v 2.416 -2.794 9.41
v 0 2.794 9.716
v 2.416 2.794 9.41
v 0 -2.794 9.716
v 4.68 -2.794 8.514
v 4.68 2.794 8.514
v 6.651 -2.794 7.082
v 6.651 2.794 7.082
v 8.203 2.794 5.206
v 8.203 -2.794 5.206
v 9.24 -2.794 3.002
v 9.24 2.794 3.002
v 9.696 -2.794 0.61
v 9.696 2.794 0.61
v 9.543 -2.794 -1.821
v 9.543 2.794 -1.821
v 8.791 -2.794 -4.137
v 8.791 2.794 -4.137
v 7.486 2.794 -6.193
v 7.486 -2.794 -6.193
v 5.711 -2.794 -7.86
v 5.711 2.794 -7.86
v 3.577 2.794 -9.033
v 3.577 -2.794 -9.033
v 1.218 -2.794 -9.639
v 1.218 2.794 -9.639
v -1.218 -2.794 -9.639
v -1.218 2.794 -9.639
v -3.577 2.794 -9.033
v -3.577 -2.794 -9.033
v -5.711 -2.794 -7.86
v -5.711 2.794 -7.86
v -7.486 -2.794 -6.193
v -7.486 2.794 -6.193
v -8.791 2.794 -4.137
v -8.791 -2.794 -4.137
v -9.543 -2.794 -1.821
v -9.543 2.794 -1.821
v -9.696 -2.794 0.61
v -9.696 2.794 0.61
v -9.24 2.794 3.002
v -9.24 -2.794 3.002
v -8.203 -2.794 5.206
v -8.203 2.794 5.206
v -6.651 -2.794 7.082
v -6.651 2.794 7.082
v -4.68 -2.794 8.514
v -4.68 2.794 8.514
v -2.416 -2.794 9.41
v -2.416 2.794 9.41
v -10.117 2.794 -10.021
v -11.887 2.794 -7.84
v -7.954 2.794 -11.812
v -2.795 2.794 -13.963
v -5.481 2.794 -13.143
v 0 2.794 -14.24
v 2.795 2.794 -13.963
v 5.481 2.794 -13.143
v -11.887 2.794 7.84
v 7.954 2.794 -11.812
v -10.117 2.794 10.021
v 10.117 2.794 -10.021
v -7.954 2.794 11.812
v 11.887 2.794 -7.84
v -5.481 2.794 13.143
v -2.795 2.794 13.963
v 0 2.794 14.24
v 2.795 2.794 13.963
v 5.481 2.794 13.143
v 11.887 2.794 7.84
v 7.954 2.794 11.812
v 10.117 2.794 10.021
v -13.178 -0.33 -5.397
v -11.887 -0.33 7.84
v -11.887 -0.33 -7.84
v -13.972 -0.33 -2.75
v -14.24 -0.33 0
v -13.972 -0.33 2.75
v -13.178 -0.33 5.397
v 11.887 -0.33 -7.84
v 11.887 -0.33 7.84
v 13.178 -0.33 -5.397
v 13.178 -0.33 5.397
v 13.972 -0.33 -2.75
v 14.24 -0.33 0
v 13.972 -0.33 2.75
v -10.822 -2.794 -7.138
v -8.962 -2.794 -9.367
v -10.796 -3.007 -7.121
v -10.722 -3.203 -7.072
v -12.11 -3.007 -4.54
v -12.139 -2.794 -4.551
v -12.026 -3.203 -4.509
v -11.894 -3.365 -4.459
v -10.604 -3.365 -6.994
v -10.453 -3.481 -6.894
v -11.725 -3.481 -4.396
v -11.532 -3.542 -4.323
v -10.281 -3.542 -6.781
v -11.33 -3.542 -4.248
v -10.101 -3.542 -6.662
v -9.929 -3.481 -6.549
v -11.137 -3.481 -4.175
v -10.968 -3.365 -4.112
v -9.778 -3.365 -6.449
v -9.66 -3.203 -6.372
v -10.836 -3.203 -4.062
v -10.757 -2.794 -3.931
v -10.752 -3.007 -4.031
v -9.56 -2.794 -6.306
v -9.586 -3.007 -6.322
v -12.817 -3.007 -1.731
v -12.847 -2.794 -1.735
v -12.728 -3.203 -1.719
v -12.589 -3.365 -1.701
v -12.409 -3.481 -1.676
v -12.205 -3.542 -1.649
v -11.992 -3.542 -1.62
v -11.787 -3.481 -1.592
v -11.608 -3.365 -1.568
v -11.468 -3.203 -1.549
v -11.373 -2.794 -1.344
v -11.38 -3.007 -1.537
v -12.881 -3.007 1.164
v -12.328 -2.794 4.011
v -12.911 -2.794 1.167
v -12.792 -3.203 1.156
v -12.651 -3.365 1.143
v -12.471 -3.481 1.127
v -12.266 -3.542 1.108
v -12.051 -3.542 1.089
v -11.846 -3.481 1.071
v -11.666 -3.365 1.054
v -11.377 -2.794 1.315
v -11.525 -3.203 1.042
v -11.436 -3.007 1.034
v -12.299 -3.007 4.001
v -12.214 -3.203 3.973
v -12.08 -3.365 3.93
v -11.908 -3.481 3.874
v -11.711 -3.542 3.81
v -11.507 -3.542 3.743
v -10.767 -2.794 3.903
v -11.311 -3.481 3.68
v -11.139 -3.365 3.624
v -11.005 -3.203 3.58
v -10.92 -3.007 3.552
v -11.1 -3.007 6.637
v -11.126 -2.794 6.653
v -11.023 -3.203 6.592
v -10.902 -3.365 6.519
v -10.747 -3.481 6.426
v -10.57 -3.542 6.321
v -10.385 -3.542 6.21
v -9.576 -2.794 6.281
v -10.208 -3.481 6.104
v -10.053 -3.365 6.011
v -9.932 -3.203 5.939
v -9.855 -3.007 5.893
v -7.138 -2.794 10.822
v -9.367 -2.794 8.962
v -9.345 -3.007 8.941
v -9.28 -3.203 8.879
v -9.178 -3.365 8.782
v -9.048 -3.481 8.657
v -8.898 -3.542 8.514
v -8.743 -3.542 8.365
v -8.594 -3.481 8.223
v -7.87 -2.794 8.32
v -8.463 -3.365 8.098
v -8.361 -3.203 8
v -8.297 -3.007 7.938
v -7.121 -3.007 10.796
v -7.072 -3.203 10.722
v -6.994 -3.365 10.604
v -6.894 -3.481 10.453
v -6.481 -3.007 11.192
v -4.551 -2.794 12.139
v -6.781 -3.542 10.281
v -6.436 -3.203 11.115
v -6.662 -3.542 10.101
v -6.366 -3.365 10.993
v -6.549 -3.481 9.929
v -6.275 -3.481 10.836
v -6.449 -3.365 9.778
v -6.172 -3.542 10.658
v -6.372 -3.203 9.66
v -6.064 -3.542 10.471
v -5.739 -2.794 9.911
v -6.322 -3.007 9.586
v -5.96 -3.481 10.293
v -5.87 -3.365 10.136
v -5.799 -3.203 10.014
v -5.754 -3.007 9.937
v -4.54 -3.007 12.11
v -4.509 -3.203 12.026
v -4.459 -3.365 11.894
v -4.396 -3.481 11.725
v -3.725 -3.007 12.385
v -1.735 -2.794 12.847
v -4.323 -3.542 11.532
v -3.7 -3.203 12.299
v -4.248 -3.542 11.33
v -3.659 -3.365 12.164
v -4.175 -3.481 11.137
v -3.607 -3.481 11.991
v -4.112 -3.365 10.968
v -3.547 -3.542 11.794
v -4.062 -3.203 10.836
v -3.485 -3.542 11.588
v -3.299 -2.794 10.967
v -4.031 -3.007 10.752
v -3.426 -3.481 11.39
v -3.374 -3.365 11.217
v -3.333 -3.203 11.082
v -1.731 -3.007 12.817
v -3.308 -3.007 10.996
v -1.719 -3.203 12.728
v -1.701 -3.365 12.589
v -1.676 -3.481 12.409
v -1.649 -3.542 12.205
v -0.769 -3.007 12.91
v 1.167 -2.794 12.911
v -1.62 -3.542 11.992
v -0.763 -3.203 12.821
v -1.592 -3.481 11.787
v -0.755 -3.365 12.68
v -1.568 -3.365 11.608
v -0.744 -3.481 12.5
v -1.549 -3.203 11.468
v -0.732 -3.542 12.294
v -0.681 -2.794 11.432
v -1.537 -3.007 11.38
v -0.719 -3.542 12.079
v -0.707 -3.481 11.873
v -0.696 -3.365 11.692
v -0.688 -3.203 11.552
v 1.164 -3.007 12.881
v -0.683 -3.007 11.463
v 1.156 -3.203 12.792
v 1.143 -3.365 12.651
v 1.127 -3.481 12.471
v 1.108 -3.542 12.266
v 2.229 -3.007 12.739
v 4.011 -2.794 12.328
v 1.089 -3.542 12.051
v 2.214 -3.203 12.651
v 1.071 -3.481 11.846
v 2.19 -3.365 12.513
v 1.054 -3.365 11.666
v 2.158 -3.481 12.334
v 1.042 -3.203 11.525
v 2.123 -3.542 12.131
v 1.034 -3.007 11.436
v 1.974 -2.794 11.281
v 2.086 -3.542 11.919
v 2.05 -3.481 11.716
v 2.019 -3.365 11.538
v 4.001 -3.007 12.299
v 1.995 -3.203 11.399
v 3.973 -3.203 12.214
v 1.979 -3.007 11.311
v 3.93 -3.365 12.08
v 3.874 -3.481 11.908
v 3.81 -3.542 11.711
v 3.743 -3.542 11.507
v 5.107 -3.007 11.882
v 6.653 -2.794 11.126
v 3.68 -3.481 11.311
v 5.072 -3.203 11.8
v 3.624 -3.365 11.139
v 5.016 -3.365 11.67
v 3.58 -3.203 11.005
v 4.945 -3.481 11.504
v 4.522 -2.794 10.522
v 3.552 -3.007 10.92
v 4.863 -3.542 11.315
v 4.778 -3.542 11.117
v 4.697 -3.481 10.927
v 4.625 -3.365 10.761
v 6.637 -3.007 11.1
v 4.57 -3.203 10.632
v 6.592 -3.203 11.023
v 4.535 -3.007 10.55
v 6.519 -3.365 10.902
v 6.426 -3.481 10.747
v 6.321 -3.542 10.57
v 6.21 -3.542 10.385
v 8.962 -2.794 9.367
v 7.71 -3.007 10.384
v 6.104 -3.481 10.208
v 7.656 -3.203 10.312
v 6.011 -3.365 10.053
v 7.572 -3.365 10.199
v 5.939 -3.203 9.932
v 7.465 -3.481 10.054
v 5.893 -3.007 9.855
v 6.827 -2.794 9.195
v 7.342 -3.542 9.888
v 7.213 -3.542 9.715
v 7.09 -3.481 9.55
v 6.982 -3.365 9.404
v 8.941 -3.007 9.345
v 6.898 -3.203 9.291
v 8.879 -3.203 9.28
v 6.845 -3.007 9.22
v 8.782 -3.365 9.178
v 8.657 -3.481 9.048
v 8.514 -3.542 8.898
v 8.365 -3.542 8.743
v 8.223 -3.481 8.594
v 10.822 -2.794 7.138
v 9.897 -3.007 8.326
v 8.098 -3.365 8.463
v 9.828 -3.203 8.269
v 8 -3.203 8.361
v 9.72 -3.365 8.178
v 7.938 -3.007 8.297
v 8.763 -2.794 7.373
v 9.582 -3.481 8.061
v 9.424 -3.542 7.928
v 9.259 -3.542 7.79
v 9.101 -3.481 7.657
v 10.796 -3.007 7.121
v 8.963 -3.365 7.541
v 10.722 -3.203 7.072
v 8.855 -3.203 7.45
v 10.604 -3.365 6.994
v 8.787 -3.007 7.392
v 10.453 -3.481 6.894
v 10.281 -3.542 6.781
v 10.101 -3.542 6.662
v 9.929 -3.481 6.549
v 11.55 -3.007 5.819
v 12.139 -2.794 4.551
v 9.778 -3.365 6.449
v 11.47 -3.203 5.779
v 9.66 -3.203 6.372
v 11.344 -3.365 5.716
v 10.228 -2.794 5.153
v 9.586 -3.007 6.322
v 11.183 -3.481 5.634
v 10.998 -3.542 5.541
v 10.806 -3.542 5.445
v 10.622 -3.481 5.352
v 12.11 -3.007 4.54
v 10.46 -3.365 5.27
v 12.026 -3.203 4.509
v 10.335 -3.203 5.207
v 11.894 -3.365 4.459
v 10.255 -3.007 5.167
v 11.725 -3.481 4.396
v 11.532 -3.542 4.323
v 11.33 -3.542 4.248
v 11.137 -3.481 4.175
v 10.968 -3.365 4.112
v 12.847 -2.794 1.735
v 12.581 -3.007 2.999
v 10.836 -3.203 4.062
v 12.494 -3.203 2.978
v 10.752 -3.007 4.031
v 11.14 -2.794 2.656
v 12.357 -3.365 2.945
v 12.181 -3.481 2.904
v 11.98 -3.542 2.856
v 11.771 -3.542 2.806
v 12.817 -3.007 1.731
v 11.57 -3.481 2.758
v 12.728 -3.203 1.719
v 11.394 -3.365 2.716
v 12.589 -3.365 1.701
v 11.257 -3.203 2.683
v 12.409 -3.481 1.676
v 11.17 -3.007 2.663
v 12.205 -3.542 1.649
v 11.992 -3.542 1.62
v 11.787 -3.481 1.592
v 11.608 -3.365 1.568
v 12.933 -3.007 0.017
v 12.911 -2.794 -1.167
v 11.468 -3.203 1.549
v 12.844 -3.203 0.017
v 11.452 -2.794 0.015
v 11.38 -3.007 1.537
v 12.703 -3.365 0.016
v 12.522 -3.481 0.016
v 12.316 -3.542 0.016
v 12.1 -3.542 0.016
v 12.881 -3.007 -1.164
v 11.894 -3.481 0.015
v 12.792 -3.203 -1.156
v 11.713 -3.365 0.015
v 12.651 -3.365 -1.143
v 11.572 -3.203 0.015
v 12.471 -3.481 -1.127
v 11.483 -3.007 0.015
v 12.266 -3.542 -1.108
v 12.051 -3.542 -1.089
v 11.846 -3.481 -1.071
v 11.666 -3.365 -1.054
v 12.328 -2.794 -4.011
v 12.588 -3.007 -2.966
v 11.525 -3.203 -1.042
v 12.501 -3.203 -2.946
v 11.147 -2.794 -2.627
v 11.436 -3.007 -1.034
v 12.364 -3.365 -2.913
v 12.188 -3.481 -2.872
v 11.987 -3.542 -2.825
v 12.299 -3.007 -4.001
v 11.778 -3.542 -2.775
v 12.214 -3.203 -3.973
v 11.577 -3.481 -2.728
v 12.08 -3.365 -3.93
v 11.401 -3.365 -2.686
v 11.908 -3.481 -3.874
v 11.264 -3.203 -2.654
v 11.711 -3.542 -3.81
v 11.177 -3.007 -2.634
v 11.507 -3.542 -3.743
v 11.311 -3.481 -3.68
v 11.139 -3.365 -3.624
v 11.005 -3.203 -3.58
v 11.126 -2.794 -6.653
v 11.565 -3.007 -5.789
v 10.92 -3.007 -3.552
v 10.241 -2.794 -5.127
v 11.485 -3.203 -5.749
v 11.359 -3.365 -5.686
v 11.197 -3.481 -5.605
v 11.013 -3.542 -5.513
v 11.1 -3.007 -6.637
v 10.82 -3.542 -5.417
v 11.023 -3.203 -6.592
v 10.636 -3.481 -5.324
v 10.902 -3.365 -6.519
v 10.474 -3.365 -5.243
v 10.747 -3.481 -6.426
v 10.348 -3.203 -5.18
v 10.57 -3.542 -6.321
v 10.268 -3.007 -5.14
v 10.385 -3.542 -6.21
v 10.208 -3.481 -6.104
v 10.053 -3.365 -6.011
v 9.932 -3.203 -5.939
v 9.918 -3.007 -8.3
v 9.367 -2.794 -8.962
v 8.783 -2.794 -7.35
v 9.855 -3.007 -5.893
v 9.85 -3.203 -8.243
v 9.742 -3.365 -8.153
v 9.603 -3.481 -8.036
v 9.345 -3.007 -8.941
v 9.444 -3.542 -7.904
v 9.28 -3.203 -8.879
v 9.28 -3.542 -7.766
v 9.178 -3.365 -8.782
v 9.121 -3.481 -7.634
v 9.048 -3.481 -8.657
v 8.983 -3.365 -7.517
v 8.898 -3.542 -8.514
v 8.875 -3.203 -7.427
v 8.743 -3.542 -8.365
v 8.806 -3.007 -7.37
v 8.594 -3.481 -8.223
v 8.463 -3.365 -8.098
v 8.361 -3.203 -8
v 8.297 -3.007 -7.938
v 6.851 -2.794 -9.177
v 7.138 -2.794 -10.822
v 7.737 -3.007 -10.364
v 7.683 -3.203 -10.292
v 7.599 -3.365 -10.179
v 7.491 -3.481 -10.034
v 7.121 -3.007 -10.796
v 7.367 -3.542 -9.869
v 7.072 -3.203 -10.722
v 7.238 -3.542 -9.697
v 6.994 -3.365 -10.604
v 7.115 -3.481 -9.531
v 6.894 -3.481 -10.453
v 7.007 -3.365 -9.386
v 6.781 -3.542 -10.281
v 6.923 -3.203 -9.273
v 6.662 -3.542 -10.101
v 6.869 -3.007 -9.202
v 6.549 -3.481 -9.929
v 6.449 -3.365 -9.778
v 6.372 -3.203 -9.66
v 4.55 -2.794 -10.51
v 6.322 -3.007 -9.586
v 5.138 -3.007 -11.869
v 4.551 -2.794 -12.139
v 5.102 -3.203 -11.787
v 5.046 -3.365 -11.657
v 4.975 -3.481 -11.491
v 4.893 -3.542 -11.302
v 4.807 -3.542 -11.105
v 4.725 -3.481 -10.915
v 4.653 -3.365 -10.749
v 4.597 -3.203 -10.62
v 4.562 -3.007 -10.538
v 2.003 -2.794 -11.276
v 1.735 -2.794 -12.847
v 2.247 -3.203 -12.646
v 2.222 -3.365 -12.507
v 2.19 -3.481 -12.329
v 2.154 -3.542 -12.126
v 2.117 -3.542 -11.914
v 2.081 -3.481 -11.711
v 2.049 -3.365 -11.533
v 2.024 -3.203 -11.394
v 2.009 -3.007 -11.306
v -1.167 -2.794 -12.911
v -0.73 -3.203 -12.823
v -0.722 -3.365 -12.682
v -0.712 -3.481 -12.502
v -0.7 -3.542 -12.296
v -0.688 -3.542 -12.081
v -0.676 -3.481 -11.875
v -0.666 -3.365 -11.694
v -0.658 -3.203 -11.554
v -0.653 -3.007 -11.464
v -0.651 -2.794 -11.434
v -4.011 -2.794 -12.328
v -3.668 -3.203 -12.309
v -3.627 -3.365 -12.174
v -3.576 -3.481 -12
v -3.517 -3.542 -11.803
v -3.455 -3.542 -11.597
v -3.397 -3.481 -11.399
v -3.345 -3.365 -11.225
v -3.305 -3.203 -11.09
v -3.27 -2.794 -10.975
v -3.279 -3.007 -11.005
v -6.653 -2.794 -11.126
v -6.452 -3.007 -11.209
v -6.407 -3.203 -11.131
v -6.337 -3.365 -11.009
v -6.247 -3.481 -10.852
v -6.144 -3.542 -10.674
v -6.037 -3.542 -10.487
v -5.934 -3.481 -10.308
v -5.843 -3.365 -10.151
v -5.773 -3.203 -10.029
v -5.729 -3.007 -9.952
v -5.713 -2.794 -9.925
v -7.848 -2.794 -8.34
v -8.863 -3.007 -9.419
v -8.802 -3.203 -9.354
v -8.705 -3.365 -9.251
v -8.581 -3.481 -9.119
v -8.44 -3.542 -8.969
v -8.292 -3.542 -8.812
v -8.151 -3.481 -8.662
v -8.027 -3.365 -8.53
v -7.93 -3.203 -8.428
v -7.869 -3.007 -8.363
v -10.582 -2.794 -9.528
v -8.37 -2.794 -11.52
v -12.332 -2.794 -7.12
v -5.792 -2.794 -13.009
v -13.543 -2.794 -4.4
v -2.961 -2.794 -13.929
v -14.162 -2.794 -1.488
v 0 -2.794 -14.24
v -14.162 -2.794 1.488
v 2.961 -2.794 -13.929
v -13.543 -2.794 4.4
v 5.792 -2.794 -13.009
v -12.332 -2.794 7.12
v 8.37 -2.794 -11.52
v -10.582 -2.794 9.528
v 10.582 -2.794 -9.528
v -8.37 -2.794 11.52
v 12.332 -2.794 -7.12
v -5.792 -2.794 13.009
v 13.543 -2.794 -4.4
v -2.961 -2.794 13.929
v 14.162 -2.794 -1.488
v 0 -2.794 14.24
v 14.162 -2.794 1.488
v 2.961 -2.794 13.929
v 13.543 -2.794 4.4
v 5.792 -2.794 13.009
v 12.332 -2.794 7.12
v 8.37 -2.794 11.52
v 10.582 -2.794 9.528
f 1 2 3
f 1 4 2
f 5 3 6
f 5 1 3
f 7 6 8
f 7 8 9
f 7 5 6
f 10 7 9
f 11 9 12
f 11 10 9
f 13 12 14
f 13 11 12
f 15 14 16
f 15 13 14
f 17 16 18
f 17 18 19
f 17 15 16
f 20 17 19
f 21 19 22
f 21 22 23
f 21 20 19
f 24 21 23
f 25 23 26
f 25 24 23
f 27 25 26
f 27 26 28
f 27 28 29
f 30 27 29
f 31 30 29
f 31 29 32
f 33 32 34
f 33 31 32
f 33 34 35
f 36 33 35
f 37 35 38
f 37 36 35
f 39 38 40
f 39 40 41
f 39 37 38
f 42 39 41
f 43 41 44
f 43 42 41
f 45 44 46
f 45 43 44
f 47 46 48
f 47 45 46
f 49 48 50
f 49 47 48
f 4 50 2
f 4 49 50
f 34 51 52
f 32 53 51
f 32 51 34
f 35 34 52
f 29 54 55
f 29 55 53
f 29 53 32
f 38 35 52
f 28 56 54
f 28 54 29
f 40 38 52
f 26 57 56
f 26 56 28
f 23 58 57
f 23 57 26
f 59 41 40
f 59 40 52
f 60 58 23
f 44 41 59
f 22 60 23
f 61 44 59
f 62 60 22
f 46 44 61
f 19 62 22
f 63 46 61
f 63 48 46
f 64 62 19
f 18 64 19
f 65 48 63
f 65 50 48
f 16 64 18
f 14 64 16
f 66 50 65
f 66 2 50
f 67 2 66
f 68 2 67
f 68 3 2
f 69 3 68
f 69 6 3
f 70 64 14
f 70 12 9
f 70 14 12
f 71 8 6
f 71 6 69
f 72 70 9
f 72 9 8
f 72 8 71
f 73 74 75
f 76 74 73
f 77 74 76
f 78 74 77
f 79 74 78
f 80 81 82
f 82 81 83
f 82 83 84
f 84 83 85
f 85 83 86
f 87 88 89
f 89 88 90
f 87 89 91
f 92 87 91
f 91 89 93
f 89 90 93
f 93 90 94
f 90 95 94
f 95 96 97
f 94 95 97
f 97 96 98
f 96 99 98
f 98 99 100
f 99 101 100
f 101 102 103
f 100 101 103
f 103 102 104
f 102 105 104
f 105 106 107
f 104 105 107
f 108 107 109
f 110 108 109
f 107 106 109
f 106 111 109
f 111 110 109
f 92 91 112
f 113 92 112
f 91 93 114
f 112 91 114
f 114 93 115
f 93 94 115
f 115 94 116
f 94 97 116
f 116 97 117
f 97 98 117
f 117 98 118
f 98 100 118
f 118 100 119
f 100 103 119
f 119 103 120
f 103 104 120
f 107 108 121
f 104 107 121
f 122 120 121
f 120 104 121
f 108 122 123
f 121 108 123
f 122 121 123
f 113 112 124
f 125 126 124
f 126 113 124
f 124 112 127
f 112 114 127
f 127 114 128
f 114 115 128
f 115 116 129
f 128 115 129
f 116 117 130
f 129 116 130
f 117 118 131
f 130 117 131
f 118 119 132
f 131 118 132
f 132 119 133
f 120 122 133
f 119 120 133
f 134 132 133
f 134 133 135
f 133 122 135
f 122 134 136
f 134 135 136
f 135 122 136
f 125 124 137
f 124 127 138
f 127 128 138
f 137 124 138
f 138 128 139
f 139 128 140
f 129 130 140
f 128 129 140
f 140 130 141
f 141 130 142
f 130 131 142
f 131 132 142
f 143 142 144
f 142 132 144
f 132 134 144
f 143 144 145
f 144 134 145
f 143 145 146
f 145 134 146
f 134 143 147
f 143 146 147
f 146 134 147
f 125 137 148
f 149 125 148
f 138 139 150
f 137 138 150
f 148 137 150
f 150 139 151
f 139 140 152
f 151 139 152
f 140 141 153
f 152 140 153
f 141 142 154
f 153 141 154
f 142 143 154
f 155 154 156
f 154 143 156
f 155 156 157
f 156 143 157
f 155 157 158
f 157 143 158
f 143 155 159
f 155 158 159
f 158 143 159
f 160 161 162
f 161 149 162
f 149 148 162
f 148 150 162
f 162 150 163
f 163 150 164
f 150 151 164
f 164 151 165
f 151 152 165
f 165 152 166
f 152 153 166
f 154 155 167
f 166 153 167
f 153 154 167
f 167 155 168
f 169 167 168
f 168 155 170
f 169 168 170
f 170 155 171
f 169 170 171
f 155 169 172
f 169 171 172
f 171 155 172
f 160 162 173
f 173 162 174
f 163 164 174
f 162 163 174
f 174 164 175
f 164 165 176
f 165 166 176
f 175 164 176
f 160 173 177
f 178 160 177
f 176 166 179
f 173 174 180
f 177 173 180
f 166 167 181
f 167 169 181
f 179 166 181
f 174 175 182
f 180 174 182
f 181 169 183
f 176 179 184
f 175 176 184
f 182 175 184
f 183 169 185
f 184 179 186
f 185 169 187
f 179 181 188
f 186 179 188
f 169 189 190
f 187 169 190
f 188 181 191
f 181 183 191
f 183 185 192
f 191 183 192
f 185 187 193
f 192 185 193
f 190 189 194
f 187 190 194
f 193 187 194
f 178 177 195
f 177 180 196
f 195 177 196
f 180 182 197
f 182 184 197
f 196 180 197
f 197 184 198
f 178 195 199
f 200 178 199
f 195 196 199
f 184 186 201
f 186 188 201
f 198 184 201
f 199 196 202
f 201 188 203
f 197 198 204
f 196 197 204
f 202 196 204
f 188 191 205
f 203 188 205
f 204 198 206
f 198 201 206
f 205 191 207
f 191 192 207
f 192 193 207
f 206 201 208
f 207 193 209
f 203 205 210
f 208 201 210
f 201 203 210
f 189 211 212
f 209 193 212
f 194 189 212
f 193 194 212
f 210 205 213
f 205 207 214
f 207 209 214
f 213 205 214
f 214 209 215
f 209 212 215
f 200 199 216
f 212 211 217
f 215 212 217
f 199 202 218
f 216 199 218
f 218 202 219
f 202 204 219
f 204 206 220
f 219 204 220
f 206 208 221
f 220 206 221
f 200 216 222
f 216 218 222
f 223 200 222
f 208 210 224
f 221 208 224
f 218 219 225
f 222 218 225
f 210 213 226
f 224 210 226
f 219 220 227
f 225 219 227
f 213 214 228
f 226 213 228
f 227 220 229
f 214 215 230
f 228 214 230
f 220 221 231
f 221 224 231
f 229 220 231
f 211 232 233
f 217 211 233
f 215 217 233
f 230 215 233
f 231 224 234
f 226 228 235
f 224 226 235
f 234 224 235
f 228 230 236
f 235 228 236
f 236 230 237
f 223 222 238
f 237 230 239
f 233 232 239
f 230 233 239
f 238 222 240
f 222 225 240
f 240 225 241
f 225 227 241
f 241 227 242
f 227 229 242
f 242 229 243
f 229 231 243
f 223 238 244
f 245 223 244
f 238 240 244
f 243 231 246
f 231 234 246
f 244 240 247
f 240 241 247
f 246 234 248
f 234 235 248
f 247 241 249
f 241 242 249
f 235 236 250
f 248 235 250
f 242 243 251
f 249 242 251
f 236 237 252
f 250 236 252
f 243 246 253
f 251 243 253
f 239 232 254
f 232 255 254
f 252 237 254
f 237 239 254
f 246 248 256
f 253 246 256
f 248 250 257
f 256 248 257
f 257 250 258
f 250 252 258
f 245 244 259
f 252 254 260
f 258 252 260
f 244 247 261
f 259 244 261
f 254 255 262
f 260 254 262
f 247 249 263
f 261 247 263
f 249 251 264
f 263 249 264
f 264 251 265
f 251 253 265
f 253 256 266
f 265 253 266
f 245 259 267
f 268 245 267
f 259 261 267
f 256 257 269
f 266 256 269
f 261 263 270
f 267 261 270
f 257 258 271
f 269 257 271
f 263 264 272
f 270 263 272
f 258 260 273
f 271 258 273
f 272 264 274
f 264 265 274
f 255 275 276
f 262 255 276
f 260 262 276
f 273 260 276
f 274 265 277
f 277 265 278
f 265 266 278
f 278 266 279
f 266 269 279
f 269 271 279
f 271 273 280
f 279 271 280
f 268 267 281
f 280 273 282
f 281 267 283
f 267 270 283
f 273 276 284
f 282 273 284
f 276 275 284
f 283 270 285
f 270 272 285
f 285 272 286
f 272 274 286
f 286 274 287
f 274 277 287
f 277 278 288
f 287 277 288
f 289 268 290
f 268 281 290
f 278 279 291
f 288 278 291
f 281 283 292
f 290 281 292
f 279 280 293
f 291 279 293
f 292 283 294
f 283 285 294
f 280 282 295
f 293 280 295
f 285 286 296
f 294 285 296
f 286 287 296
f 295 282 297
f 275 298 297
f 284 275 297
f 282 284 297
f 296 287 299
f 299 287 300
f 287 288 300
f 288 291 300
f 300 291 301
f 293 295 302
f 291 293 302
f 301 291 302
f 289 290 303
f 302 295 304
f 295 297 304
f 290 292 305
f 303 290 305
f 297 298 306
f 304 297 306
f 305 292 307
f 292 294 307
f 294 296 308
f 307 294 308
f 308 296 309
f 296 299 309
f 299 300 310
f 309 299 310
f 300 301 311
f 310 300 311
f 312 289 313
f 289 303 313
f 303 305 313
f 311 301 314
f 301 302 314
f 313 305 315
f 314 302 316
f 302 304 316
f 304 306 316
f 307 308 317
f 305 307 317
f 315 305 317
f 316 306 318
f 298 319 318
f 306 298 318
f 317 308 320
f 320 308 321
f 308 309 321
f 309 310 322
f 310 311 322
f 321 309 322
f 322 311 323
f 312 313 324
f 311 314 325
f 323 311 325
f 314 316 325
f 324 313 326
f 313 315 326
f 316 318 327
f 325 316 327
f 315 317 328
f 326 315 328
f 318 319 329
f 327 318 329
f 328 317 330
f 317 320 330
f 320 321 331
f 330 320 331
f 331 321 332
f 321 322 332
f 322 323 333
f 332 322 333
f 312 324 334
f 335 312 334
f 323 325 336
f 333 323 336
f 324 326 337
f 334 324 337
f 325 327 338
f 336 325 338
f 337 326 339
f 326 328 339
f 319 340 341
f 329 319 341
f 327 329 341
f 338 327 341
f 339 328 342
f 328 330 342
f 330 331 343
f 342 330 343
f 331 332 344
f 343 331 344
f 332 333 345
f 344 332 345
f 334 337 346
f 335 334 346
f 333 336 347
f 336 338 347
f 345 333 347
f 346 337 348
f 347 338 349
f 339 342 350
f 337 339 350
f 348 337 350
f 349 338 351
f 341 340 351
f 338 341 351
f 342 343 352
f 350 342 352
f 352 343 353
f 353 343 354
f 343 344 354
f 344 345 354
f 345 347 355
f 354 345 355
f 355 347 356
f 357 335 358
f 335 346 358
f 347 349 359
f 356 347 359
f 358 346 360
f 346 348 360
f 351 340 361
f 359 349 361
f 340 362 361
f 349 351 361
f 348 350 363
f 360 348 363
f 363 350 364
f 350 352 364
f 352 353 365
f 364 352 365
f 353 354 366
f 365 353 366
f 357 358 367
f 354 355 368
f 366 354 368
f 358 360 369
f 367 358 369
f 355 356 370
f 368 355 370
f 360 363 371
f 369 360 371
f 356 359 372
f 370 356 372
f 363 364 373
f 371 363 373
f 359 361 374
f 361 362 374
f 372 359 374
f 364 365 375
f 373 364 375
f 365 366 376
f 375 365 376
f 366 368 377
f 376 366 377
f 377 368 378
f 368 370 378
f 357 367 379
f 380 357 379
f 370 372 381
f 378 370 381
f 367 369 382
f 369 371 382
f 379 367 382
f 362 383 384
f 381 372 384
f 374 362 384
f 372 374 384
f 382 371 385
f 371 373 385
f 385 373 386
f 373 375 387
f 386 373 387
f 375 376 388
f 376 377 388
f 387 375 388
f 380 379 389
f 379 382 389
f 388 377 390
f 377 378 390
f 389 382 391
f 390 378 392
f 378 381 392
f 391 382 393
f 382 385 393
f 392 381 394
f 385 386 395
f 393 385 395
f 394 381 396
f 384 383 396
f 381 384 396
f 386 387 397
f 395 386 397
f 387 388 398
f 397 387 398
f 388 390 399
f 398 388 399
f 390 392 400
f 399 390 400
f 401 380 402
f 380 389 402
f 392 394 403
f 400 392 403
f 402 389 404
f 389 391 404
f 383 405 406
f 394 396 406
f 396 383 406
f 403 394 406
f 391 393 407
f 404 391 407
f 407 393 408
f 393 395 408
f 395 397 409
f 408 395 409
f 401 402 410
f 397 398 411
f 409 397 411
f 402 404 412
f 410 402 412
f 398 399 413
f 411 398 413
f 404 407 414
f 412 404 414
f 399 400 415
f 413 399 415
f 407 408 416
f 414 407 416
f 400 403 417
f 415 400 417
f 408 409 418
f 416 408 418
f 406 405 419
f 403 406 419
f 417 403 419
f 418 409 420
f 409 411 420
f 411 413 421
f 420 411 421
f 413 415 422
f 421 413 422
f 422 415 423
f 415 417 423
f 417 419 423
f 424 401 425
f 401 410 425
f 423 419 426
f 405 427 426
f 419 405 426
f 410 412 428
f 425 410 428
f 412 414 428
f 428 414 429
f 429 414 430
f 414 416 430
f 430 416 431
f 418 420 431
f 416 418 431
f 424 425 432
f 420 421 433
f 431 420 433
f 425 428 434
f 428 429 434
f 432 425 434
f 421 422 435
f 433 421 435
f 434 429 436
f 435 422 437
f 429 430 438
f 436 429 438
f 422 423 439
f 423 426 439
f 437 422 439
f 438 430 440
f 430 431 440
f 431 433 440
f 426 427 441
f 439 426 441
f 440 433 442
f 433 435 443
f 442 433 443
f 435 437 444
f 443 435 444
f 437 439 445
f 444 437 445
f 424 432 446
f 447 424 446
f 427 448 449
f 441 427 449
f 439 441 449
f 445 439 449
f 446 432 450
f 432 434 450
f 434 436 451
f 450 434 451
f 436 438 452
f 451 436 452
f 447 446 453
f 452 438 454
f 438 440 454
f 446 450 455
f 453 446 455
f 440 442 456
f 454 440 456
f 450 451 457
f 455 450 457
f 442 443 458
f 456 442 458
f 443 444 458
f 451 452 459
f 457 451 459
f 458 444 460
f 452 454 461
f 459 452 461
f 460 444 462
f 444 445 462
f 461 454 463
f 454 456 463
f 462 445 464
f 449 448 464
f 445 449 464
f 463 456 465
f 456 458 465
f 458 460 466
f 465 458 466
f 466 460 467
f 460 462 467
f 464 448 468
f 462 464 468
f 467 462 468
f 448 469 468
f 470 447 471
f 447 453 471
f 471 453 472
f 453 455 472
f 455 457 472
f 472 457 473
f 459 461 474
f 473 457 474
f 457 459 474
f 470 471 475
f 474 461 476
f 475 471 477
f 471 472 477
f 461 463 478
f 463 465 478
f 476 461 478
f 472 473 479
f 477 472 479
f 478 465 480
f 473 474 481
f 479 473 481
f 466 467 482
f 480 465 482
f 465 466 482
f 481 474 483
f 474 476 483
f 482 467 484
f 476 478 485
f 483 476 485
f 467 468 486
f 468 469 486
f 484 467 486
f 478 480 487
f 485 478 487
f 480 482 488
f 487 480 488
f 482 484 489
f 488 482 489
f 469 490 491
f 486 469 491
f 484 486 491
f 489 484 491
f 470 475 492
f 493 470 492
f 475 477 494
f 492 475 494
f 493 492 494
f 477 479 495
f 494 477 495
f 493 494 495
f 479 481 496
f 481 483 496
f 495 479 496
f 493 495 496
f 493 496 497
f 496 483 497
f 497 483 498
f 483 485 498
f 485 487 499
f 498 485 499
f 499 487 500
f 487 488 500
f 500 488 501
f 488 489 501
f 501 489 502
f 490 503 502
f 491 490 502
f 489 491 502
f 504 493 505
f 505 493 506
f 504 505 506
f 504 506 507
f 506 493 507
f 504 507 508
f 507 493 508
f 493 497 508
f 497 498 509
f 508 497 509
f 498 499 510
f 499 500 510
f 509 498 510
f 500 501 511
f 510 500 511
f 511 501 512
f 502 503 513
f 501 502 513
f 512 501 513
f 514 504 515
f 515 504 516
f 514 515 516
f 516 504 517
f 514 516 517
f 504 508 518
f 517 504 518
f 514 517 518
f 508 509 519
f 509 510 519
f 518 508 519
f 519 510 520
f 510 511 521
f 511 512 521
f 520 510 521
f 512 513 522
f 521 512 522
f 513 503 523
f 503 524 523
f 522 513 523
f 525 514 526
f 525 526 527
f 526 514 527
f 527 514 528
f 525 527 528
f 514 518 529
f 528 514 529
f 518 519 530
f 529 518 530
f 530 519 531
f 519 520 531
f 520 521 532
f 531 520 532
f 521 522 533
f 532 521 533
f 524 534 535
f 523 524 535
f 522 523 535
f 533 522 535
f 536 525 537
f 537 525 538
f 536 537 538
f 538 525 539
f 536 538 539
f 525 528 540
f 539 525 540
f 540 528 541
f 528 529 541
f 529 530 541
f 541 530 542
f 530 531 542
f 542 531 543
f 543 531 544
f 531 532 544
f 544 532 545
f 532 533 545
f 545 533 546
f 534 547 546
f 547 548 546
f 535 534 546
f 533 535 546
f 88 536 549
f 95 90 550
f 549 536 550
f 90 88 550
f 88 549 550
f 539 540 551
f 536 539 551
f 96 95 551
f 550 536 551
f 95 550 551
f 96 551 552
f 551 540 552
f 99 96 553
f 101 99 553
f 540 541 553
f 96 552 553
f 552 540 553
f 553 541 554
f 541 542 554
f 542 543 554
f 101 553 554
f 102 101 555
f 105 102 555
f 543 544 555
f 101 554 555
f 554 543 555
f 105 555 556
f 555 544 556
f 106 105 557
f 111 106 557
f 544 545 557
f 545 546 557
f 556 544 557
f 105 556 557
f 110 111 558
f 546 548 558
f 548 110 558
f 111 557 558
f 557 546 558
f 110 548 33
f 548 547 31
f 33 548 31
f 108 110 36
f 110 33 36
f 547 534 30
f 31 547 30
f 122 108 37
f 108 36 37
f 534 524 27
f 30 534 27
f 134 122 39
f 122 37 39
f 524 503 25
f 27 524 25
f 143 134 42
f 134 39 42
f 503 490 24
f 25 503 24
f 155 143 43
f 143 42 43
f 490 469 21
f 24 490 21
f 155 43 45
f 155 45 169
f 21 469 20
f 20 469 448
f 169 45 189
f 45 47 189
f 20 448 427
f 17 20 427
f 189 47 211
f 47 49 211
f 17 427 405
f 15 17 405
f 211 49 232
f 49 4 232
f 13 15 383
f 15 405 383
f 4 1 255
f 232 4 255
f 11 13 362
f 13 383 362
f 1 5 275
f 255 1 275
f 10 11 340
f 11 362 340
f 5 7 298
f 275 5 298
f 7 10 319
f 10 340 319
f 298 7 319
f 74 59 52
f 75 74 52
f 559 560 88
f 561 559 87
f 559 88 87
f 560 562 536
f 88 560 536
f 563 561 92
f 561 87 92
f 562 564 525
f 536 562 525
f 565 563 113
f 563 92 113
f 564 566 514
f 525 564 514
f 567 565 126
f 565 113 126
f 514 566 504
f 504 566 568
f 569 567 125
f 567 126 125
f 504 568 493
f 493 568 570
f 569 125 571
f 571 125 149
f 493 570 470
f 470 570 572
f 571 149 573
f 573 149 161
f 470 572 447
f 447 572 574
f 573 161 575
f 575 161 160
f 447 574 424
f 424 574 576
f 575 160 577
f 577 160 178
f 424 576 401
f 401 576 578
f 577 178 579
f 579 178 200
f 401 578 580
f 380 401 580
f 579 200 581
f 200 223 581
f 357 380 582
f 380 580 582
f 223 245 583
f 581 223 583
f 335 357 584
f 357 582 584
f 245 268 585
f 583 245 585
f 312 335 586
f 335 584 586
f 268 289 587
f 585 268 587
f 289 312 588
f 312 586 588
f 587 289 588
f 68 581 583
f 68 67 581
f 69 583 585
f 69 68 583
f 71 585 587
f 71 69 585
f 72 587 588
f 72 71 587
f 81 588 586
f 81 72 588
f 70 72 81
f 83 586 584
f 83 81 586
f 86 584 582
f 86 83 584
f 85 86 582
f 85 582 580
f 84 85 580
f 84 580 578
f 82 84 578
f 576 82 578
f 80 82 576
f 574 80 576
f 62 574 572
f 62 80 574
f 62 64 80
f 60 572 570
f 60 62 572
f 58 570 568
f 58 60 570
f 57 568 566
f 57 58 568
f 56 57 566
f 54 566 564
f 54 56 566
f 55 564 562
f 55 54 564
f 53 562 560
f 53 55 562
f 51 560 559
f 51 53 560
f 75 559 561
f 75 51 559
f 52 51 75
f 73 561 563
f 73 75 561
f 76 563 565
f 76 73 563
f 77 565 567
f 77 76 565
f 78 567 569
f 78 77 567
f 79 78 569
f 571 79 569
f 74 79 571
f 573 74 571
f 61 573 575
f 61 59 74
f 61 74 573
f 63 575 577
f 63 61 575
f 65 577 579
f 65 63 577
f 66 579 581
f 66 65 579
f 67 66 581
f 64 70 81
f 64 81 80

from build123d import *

# Parameters (mm, degrees)
SKETCH1_R           = 14.24
SKETCH1_R_2         = 9.7155
BOSS_EXTRUDE1_DEPTH = 2.794
SKETCH2_W           = 4.55251892
SKETCH2_H           = 21.070507922
CUT_EXTRUDE1_DEPTH  = 3.1242
SKETCH3_R           = 0.75565


with BuildPart() as part:
    # Sketch1 → Boss-Extrude1 (new, symmetric)
    with BuildSketch(Plane(origin=(0, 0, 0), x_dir=(1, 0, 0), z_dir=(0, 1, 0))):
        with Locations(Location((0, 0, 0), (0, 0, 270))):
            Circle(SKETCH1_R)
        with Locations(Location((0, 0, 0), (0, 0, 270))):
            Circle(SKETCH1_R_2, mode=Mode.SUBTRACT)
    extrude(amount=BOSS_EXTRUDE1_DEPTH, both=True)

    # Sketch2 → Cut-Extrude1 (cut)
    with BuildSketch(Plane(origin=(0, 2.794, 0), x_dir=(1, 0, 0), z_dir=(0, 1, 0))):
        with Locations((14.16345946, 0)):
            Rectangle(SKETCH2_W, SKETCH2_H)
    cut_extrude1 = extrude(amount=-CUT_EXTRUDE1_DEPTH, mode=Mode.SUBTRACT)

    # Mirror1: Cut-Extrude1 across plane
    add(cut_extrude1.mirror(Plane(origin=(0, 0, 0), x_dir=(0, 0, 1), z_dir=(1, 0, 0))), mode=Mode.SUBTRACT)

    # Sketch3 → Revolve1 (revolve)
    with BuildSketch(Plane(origin=(0, 0, 0), x_dir=(0, 0, -1), z_dir=(1, 0, 0)), mode=Mode.PRIVATE) as revolve1_sk:
        with Locations((-12.208, -2.794)):
            Circle(SKETCH3_R)
    revolve(revolve1_sk.sketch.rotate(Axis((0, 0, 0), (0, 1, 0)), 236.592446153), axis=Axis((0, 0, 0), (0, 1, 0)))


solid = part.part
